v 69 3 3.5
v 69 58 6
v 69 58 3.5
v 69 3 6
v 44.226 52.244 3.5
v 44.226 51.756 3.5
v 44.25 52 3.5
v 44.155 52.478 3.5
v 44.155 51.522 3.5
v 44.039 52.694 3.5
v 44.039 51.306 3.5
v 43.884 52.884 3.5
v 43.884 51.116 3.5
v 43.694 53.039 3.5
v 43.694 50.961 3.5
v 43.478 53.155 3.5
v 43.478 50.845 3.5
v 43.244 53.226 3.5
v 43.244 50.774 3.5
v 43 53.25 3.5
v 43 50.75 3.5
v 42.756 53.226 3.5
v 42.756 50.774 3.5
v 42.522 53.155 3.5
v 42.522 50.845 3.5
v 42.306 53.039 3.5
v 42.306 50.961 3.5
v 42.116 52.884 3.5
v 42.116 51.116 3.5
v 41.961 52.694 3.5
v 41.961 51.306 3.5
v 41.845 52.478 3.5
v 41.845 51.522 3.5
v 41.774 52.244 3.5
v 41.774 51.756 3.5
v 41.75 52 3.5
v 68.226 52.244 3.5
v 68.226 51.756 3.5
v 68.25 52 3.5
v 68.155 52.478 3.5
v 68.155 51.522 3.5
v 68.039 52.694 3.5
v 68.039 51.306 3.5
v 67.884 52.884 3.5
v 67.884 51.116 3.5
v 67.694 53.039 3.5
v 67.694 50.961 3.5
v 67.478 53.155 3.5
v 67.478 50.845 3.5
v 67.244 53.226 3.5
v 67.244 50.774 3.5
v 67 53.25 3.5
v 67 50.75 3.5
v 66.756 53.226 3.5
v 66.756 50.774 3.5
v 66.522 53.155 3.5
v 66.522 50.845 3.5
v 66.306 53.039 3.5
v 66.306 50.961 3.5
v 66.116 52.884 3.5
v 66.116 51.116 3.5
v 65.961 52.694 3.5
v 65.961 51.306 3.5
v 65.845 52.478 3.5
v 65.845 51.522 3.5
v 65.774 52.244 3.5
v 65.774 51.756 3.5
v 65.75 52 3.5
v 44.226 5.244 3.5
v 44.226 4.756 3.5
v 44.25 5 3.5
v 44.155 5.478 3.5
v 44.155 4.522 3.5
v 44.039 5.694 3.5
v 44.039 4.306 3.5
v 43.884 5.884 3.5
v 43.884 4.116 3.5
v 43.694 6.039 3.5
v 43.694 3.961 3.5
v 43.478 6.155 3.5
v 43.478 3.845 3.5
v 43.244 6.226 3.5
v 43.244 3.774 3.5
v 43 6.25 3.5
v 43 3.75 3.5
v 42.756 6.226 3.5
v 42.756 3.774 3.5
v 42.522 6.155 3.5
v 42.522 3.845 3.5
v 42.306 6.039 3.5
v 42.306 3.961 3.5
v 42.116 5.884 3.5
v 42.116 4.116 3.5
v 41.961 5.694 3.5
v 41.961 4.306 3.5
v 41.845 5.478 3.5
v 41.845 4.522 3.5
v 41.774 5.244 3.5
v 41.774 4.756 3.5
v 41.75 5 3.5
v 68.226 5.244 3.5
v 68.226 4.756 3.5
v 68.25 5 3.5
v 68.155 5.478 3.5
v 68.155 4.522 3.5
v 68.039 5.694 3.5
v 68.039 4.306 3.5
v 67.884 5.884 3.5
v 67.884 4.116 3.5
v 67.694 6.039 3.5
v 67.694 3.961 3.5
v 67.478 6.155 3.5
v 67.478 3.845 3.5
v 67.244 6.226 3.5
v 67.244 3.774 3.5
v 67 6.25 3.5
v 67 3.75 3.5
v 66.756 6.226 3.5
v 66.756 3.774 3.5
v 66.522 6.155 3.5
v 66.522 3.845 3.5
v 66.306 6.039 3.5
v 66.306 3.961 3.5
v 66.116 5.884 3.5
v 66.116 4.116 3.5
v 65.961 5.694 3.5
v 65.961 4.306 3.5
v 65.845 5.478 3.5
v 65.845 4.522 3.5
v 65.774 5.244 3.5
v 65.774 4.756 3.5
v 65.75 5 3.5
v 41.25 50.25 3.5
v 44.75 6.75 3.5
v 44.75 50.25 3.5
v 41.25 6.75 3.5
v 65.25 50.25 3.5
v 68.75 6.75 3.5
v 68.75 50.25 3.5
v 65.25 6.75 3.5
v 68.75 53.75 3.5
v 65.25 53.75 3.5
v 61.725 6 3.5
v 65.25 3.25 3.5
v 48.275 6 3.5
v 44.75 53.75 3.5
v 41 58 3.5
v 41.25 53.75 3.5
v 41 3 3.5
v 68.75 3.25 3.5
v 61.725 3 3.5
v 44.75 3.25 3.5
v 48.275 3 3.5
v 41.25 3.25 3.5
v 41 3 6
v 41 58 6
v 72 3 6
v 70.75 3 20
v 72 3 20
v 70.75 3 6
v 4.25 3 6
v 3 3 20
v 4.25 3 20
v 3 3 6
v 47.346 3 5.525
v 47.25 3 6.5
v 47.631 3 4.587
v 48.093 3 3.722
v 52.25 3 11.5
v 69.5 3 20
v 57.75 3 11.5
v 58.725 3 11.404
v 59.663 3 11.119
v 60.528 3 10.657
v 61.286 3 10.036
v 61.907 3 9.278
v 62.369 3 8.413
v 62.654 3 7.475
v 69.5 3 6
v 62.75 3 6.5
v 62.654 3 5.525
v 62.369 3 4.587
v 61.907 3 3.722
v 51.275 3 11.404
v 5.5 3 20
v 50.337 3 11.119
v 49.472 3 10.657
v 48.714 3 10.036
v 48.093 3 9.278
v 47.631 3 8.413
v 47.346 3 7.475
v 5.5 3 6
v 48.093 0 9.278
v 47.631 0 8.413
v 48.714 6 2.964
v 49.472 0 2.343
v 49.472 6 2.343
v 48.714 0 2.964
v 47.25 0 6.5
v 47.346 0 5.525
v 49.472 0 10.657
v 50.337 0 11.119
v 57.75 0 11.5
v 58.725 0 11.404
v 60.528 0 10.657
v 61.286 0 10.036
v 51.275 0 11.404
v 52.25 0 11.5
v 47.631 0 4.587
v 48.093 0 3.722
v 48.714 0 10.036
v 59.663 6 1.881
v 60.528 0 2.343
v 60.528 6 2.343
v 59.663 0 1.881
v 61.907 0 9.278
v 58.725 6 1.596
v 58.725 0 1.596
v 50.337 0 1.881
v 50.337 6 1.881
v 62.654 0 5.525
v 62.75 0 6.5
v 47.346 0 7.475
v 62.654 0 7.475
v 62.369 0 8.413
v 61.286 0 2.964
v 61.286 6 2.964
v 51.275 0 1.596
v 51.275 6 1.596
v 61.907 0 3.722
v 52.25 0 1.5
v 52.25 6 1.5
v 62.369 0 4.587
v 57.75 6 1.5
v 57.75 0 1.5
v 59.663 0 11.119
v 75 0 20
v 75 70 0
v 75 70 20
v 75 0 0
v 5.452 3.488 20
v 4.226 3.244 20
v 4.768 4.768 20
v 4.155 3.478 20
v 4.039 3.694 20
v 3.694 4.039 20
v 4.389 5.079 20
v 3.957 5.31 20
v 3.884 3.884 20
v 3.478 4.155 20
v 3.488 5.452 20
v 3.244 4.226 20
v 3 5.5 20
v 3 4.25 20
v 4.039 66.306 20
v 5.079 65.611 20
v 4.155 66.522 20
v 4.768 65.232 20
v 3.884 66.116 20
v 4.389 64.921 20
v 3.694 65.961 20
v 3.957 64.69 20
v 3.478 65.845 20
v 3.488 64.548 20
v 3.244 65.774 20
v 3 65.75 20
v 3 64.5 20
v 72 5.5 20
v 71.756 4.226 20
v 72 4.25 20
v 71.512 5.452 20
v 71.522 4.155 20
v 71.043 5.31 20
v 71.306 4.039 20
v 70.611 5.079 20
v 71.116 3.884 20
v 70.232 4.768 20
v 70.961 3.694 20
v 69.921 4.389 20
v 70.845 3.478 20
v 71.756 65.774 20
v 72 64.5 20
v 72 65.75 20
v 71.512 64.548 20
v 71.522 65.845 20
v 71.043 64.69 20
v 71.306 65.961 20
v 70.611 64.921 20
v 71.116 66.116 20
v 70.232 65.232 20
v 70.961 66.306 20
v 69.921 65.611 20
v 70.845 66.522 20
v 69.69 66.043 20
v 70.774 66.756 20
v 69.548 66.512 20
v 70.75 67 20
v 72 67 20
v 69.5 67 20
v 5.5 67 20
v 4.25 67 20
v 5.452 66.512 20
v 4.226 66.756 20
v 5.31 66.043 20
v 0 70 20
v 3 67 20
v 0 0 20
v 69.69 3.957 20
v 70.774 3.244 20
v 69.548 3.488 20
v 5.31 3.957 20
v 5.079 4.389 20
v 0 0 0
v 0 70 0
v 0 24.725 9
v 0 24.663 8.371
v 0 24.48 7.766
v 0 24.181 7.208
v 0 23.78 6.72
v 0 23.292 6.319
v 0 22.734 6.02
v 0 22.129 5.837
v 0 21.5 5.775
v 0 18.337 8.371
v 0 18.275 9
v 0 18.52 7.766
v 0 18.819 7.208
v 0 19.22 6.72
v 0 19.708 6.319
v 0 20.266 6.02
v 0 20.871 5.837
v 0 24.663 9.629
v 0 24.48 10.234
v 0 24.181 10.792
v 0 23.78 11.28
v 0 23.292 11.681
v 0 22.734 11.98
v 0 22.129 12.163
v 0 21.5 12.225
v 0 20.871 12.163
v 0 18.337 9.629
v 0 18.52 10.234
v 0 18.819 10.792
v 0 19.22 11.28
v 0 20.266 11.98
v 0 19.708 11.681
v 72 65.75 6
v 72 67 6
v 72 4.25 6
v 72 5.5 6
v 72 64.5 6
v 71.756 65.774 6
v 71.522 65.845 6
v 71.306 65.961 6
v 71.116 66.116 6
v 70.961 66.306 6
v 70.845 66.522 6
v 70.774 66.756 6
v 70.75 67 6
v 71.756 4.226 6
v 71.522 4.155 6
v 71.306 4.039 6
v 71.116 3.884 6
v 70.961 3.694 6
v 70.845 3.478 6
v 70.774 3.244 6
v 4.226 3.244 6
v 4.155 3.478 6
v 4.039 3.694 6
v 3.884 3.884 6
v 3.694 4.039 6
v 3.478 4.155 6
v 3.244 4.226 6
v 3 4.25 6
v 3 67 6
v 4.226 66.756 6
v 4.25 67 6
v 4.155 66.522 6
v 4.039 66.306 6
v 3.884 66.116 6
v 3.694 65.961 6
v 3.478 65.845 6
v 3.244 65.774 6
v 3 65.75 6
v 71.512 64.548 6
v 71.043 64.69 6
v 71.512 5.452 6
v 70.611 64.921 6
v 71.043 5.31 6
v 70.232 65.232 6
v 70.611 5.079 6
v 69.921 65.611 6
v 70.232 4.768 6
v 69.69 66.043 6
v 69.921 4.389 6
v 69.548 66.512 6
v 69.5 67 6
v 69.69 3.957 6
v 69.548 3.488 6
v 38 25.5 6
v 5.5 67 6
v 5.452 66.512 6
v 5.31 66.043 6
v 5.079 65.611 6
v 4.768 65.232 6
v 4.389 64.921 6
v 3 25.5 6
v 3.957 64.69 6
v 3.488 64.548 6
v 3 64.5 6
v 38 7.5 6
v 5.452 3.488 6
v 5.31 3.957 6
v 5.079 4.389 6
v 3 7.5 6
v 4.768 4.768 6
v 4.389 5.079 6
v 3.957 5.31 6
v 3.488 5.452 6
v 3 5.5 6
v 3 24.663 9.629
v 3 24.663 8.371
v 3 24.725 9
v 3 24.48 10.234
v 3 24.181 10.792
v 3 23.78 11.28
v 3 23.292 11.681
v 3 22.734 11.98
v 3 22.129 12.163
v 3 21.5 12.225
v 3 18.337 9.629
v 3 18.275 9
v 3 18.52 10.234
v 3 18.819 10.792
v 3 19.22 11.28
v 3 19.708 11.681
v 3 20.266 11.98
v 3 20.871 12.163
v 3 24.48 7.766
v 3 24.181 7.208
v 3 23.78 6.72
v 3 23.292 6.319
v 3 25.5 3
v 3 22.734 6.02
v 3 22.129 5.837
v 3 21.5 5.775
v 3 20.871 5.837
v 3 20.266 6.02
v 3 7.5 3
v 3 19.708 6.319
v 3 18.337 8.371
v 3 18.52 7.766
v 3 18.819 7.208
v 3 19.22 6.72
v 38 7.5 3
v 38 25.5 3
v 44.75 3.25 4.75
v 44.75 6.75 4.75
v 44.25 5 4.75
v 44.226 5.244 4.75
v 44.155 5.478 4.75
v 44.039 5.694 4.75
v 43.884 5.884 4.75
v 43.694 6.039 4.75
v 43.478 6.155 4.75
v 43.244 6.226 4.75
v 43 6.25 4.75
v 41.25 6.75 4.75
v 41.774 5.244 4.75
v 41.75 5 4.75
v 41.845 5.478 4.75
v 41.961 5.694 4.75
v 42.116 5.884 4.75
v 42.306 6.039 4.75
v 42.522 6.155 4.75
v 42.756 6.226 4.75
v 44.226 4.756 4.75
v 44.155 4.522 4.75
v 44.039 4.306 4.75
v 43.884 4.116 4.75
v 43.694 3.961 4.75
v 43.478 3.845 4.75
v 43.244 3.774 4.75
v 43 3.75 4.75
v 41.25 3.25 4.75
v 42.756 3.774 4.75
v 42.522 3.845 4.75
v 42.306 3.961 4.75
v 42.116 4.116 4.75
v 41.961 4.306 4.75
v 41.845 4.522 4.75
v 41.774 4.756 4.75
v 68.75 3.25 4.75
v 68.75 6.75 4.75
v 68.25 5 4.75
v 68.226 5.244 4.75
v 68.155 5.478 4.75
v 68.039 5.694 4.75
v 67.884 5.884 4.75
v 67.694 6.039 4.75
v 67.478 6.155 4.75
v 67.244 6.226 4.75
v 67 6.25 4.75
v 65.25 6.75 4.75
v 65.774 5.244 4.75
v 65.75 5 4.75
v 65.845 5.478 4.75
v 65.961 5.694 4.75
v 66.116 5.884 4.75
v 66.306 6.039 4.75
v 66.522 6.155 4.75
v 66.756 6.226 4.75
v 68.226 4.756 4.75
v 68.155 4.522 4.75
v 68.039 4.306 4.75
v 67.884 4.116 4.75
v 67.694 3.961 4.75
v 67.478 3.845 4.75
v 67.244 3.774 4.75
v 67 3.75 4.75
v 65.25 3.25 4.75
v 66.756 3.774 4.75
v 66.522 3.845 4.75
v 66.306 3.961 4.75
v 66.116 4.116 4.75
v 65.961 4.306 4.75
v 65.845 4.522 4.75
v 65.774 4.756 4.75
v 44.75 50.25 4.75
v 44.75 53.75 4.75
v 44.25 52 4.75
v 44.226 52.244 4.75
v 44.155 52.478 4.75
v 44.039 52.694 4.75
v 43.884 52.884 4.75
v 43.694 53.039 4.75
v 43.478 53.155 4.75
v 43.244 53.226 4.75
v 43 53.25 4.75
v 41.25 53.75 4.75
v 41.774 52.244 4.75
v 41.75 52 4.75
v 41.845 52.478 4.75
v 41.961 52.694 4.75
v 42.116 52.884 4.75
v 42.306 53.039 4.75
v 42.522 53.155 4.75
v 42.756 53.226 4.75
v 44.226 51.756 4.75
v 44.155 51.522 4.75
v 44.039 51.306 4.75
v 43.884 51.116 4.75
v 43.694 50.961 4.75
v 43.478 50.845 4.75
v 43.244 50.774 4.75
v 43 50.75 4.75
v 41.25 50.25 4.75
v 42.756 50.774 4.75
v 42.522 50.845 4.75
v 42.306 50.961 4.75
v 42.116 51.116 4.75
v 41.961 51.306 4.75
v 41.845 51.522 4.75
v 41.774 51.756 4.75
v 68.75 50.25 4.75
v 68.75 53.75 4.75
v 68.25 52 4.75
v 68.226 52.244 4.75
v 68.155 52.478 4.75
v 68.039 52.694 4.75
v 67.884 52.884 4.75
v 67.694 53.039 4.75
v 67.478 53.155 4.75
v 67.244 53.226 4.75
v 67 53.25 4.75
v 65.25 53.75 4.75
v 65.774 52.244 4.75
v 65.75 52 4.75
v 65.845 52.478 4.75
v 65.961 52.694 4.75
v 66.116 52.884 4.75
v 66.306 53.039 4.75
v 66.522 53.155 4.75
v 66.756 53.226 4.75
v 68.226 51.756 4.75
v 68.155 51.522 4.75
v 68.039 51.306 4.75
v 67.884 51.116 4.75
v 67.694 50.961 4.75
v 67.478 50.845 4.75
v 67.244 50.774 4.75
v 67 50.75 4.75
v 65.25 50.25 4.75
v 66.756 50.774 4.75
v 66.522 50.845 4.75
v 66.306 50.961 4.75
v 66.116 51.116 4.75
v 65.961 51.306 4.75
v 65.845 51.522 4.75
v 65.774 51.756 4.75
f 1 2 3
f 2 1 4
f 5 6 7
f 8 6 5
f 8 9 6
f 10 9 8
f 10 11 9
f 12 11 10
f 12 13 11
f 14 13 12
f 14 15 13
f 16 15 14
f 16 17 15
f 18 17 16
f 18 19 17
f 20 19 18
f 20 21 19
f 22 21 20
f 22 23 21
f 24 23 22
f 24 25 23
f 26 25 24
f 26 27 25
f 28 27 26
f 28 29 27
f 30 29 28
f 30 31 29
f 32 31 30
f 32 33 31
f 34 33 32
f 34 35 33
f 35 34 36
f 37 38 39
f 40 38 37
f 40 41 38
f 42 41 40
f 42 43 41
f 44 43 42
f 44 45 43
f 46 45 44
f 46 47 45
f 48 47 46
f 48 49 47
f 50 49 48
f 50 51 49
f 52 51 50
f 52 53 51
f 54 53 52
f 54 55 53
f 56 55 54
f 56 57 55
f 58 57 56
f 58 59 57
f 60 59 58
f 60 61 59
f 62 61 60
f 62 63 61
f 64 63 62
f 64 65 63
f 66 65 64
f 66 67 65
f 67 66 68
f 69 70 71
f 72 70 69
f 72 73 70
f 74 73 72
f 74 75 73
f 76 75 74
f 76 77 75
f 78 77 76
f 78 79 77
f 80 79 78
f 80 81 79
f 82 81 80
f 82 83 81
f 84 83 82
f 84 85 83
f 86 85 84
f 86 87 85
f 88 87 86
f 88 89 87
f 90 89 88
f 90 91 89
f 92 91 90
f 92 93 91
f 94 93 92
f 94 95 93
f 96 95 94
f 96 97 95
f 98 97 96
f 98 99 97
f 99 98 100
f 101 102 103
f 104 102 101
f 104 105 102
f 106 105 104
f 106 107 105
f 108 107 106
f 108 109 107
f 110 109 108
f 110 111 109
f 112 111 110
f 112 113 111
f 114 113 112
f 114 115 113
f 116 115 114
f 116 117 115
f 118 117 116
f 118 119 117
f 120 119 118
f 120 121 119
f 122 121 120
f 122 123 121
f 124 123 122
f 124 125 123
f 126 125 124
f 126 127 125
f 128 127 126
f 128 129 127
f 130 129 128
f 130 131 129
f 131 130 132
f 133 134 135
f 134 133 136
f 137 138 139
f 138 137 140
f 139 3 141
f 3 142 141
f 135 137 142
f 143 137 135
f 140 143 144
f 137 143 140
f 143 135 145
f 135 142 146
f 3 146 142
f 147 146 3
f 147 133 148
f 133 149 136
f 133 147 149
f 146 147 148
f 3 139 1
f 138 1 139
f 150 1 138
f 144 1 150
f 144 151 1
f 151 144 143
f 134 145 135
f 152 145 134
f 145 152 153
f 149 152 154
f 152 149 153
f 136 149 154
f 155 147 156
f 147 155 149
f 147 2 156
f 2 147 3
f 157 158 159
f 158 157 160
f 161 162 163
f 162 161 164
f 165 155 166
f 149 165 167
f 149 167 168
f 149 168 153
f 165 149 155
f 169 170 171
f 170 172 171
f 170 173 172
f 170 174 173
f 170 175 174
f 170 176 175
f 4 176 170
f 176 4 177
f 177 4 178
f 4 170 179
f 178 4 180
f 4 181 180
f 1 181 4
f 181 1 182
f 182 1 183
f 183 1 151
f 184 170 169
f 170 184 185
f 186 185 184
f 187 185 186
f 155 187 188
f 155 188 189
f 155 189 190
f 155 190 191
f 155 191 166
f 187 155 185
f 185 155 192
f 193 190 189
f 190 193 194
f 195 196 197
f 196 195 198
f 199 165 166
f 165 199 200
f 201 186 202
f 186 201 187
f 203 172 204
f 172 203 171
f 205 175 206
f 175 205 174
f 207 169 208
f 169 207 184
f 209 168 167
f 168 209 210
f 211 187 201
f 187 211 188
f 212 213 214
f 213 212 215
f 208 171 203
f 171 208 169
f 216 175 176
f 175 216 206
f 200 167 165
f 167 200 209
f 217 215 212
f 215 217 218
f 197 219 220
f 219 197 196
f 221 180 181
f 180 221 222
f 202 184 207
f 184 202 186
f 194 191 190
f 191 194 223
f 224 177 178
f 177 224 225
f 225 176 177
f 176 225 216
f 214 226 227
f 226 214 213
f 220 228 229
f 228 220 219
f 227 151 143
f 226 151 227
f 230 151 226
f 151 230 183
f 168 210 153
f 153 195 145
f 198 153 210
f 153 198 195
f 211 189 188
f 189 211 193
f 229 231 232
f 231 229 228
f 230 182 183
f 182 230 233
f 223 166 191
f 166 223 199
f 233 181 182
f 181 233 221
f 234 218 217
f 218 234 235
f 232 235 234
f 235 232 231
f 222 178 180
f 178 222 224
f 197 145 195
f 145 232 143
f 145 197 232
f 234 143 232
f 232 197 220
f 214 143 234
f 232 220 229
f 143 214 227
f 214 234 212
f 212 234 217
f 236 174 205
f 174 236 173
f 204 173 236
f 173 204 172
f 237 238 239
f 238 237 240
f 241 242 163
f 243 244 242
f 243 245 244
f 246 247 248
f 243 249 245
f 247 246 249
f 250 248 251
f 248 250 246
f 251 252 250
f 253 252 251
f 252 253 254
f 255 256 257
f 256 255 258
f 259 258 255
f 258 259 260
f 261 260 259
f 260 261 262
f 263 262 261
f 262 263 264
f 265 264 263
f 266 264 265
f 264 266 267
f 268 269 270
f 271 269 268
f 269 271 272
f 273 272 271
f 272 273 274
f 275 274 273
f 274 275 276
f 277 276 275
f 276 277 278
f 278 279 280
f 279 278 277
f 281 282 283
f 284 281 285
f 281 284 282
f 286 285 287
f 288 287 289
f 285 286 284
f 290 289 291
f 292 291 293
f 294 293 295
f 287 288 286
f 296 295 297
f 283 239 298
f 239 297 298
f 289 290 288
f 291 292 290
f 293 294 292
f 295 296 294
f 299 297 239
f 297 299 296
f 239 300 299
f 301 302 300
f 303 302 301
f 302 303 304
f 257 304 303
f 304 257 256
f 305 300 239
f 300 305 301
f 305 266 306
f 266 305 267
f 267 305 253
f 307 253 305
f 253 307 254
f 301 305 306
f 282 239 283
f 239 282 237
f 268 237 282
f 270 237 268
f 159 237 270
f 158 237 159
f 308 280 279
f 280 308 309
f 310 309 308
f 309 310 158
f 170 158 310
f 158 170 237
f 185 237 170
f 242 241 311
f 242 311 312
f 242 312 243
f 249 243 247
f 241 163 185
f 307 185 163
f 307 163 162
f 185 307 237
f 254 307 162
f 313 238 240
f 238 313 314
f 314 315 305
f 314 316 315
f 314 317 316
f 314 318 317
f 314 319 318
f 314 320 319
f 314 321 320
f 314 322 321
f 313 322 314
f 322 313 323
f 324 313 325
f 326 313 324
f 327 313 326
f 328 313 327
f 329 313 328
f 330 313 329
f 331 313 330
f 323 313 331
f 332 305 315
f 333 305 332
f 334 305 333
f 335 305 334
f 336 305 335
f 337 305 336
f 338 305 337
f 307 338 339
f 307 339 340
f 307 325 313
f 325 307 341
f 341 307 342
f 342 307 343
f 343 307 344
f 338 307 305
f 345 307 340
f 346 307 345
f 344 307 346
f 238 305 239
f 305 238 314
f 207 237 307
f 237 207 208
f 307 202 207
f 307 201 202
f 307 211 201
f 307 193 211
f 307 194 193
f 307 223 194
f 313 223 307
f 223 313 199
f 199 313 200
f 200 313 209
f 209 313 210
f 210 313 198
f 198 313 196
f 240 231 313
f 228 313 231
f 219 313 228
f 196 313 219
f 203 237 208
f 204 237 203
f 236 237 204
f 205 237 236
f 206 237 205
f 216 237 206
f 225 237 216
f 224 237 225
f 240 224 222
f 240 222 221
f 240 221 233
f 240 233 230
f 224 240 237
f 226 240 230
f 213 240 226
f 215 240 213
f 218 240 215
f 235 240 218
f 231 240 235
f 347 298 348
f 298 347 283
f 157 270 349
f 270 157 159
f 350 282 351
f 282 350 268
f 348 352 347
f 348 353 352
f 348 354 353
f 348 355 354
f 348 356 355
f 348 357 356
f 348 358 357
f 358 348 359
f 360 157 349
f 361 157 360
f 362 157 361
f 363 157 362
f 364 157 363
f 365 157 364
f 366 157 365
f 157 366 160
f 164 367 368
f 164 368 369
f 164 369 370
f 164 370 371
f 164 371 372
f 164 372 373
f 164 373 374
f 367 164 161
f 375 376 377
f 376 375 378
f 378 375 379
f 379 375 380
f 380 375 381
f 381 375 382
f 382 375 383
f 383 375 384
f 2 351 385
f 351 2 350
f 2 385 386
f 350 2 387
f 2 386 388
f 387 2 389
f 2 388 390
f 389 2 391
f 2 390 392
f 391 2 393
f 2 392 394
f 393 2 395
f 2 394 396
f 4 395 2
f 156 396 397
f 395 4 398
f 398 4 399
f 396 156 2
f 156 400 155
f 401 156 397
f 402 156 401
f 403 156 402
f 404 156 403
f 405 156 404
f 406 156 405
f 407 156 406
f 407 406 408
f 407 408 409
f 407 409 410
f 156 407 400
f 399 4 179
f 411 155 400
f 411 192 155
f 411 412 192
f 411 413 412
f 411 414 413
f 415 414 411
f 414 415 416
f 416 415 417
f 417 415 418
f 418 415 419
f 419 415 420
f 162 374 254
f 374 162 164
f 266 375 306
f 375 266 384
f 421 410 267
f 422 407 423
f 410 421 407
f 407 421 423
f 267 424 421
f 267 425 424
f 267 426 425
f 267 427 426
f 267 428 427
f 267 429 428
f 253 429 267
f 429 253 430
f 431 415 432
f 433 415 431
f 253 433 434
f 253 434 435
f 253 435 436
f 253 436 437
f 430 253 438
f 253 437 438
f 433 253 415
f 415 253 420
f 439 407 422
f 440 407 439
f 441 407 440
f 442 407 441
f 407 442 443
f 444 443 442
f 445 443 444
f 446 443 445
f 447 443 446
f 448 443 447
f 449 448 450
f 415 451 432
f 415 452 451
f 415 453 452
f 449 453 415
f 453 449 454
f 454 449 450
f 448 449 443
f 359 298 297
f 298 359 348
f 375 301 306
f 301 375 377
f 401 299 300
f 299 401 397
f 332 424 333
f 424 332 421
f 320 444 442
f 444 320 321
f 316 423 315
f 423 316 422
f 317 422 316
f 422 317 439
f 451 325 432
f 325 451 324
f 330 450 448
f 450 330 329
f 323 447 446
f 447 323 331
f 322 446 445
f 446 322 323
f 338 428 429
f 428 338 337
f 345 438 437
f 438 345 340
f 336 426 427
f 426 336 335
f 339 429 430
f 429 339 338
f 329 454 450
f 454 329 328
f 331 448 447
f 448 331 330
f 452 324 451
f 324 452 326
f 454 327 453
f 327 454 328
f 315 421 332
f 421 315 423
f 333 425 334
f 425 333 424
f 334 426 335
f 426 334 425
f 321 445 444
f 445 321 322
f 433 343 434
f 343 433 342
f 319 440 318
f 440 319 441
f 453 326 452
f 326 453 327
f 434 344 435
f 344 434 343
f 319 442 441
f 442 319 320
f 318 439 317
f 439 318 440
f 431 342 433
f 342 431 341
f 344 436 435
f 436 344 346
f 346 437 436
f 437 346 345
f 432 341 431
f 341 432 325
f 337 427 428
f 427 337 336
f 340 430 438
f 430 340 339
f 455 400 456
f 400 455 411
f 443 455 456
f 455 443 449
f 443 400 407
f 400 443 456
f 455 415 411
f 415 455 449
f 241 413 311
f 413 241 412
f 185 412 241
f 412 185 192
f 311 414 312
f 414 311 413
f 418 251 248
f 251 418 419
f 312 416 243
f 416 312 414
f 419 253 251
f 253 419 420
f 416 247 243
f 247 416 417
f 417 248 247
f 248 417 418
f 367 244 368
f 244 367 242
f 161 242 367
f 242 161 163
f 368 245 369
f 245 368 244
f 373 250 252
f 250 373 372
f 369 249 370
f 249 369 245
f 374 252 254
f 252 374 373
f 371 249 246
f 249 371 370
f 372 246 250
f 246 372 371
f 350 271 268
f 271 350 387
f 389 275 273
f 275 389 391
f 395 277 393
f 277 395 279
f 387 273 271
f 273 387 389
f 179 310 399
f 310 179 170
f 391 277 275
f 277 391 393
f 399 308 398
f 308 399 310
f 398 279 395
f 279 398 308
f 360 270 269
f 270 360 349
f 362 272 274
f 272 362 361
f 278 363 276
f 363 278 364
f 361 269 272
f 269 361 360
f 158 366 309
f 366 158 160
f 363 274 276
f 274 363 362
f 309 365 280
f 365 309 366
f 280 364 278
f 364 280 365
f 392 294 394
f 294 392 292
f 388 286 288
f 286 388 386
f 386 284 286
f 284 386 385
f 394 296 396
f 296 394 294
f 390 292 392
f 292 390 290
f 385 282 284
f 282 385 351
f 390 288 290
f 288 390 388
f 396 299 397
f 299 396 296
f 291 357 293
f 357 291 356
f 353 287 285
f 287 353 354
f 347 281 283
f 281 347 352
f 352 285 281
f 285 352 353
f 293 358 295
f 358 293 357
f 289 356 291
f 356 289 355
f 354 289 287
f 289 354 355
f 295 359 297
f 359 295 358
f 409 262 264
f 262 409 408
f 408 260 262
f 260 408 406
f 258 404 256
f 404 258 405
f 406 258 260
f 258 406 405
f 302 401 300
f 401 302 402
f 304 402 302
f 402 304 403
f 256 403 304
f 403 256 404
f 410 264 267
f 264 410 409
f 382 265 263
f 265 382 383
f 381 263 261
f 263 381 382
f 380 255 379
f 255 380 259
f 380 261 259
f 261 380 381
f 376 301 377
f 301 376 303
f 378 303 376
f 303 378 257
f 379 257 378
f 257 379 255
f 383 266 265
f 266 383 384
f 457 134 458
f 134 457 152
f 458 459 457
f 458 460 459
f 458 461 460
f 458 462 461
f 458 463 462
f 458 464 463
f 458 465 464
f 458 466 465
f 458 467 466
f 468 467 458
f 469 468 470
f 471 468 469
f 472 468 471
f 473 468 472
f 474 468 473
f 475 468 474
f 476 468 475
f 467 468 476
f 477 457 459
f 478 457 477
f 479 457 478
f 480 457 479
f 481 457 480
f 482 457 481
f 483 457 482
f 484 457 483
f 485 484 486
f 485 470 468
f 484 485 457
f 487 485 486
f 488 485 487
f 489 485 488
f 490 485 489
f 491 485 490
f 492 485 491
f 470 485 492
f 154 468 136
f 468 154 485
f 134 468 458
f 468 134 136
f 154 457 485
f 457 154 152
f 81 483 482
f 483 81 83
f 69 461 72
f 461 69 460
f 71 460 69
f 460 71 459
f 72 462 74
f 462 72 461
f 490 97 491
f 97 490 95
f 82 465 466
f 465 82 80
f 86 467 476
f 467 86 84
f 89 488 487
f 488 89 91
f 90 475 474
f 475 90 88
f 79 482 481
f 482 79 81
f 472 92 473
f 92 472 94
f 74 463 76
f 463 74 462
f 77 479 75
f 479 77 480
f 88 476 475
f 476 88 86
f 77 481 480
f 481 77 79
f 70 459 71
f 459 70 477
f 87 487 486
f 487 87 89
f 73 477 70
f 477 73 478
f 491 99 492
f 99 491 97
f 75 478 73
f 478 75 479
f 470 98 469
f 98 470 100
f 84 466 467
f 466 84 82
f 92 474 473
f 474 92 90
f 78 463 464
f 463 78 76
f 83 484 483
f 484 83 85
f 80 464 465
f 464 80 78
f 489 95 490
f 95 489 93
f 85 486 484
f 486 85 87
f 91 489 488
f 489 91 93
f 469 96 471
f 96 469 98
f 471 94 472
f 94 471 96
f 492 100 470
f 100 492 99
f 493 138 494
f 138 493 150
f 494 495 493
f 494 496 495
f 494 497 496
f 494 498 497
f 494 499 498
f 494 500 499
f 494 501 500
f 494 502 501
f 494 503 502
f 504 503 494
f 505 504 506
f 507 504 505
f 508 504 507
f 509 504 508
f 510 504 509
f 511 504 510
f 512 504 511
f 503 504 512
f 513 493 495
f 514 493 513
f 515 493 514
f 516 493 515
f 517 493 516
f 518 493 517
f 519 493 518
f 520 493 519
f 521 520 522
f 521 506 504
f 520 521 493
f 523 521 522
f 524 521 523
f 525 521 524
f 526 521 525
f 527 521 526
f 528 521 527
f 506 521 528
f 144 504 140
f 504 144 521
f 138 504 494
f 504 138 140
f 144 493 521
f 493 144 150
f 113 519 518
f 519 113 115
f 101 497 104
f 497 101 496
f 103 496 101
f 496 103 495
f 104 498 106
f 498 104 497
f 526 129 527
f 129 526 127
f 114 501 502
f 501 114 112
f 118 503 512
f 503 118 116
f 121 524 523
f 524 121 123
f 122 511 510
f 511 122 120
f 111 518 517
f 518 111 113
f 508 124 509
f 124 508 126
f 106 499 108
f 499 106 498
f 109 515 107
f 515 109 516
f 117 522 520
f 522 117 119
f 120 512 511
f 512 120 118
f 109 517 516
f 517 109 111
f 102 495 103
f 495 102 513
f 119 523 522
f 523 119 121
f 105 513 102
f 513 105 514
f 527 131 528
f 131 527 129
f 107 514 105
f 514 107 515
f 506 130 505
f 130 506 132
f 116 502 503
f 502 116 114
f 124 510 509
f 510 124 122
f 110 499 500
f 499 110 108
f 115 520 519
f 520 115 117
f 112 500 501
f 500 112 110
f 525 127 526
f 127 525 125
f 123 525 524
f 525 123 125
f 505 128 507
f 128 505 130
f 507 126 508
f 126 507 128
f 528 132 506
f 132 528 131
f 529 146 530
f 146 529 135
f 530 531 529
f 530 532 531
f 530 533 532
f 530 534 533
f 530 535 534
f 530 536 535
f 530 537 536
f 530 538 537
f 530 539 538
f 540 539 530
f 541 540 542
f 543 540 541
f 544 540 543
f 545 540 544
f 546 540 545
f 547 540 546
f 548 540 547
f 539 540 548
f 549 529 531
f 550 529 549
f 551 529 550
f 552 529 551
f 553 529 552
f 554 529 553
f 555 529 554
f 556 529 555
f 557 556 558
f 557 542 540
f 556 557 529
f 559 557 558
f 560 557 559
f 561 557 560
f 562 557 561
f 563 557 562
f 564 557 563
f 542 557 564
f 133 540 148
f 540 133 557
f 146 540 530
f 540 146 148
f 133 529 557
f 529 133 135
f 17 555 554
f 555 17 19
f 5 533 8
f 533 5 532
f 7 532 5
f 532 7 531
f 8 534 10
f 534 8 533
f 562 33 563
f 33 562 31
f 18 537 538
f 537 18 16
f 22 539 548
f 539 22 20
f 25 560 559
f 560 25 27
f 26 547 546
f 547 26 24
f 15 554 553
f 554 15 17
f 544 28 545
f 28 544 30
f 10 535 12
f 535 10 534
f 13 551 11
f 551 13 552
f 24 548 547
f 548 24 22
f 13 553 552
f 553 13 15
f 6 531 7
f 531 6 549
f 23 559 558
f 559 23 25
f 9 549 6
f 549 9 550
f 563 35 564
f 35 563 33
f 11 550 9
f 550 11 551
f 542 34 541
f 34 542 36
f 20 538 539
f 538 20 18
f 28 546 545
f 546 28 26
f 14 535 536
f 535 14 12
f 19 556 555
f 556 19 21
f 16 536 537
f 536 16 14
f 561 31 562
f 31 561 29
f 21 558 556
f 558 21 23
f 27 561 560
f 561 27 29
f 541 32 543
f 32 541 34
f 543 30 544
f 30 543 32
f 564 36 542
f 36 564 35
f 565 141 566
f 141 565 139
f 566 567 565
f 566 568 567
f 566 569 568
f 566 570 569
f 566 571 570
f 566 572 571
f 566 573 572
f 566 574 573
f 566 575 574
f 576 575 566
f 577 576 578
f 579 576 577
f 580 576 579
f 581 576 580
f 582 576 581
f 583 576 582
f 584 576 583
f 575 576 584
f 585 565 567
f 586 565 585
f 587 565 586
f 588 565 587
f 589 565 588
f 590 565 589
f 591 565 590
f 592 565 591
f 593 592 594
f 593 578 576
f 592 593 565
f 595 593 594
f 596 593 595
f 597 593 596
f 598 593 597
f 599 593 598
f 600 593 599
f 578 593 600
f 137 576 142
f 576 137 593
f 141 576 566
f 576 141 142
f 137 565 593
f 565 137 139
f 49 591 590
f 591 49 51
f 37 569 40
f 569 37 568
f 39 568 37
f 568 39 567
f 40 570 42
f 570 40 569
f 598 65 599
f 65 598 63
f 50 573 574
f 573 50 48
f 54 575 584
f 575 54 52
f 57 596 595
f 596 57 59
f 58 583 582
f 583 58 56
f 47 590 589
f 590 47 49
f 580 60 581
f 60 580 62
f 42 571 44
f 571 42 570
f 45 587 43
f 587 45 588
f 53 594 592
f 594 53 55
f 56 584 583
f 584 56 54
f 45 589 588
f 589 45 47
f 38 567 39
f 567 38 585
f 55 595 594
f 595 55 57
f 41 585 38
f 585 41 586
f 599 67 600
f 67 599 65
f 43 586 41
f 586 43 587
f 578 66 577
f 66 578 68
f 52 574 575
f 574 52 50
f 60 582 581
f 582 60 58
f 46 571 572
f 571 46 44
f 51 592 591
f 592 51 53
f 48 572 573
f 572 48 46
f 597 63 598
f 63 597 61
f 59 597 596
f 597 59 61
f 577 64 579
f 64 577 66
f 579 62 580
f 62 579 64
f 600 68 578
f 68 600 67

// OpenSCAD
//r = 3.175;
//n = 10;
//$fn = r * cos(pi/n); apotema
$fn = 32;
union(){
difference(){
    
    union(){
        ///////CASE WALLS
        //case (+ 3 mm walls)
        cube([75,70,20]); 
        }
        
    //case cavity
    translate([3,3,6]) cube([69,64,21]);
    
    //SMA connector cavity
    translate([-5,21.5,9]) rotate([0,90,0]) 
    cylinder(h = 11.5,d = 6.45 );
    
    //DX-LR02 cavity
   translate([3,4+3.5,3])cube([35,18,6]);
    
    
    //ESP32 cavity
    translate([0,0,1.5])
        union(){
    translate([69-28,3,2])cube([28,55,6]);
    //USB-C cavity
    hull(){
        translate([69-(28/2)+2.75,6,5]) rotate([90,0,0]) cylinder(h=7,d=10);
        translate([69-(28/2)-2.75,6,5]) rotate([90,0,0]) cylinder(h=7,d=10);
        }
    }
}
    
//case-closing-screws turrets
        difference(){
        translate([3,3,6]) cylinder(h=14,d=5);
            #translate([3,3,6])cylinder(h=20,d=2.5);  //screw hole
        }
        difference(){
        translate([72,3,6]) cylinder(h=14,d=5);
            #translate([72,3,6])cylinder(h=20,d=2.5);
            
        }
        difference(){
        translate([72,67,6]) cylinder(h=14,d=5);              
            #translate([72,67,6])cylinder(h=20,d=2.5);
        }
        
        difference(){
        translate([3,67,6]) cylinder(h=14,d=5);
            #translate([3,67,6])cylinder(h=20,d=2.5);
            }
       //esp32 screwholes
            difference(){
        translate([69-26,5,3])cube([3.5,3.5,3.5],center = true);
                #translate([69-26,5,5])cylinder(h=3,d=2.5,center = true);
            }
                        difference(){
        translate([69-2,5,3])cube([3.5,3.5,3.5],center = true);
                #translate([69-2,5,5])cylinder(h=3,d=2.5,center = true);
            }
                     difference(){
        translate([69-26,52,3])cube([3.5,3.5,3.5],center = true);
                #translate([69-26,52,5])cylinder(h=3,d=2.5,center = true);
            }
                     difference(){
        translate([69-2,52,3])cube([3.5,3.5,3.5],center = true);
                #translate([69-2,52,5])cylinder(h=3,d=2.5,center = true);
            }
        }
    
